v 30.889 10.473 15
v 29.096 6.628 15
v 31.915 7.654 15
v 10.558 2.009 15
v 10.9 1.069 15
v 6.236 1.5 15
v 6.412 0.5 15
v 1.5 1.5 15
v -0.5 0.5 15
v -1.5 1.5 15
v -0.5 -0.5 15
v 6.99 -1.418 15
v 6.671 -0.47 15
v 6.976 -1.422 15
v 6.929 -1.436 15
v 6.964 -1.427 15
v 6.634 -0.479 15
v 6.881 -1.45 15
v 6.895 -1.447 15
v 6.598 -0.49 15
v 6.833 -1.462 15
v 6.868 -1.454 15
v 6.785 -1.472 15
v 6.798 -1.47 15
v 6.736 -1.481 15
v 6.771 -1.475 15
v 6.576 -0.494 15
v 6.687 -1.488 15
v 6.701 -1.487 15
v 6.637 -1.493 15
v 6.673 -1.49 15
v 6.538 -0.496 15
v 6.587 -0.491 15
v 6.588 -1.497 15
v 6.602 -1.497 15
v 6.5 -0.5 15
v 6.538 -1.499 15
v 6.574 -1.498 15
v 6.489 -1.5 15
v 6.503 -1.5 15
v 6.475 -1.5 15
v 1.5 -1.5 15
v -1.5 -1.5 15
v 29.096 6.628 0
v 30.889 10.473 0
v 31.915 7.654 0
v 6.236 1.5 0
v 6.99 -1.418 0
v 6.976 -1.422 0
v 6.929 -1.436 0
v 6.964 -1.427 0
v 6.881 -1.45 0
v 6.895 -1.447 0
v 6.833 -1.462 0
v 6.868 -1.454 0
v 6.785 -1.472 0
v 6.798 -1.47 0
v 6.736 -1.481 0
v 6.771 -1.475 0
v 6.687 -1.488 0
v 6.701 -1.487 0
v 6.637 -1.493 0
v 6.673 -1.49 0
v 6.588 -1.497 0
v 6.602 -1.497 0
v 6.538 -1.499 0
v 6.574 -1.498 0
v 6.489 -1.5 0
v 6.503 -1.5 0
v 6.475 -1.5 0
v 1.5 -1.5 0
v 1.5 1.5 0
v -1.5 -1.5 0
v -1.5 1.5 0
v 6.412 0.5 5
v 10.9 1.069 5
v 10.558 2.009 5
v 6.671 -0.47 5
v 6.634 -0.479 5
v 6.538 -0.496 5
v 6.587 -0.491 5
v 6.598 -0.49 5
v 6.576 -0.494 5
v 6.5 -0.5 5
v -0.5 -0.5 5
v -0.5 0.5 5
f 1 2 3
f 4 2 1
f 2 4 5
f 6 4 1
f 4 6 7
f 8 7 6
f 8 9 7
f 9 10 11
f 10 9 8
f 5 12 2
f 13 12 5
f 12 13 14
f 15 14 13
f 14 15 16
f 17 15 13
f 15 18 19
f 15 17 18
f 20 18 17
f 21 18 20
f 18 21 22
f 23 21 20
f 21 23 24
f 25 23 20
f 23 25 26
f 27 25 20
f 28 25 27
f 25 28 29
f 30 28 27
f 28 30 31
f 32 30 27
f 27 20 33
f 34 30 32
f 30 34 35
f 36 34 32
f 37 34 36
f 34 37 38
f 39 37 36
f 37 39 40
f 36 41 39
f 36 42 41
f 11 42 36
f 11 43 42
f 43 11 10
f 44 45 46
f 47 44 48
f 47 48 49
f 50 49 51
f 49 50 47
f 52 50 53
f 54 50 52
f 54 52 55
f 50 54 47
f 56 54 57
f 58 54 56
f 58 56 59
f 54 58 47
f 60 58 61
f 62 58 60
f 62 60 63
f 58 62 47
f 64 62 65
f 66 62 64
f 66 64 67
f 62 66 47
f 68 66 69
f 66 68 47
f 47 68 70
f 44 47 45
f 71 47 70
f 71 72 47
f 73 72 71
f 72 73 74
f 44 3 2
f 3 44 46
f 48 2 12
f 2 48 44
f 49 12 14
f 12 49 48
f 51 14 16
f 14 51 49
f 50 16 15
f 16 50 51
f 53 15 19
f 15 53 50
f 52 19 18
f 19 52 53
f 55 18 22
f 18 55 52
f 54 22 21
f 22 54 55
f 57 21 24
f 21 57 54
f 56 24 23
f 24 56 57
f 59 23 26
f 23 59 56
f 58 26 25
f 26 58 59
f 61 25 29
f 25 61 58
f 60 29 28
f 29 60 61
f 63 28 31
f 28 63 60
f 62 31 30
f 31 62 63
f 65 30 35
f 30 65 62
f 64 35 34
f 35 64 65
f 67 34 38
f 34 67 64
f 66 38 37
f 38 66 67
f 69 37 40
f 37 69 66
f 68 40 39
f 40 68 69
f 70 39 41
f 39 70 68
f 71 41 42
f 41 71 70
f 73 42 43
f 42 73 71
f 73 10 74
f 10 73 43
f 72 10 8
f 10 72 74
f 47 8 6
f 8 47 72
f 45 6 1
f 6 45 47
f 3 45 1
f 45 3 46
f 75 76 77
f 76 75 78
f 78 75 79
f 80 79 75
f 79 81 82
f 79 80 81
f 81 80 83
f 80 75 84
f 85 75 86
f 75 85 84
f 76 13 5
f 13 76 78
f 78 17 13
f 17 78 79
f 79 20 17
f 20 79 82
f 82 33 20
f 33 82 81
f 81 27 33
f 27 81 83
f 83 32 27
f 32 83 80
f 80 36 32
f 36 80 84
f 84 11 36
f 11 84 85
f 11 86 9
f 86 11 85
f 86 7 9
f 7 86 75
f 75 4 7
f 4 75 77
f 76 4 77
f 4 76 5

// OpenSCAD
Arm_Length = 6.5; // 0.1
Arm_Width = 10; // 0.1
Arm_Thickness = 1; // 0.1
Tab_Length = 4.0; // 0.1
Tab_Angle = 20; // 0.1
Extension_Length = 25; // 0.1
Extension_Width = 15; // 0.1
Extension_Thickness = 3; // 0.1

$fa = $preview ? 10 : 2;
$fs = $preview ? 0.5 : 0.1;

module line(start, end, thickness = 1) {
	hull() {
		translate(start)
			if ($children > 0)
				children(0);
			else
				square(thickness, center=true);
		translate(end)
			if ($children > 1)
				children(1);
			else if ($children > 0)
				children(0);
			else
				square(thickness, center=true);
	}
}

translate([0, 0, Extension_Width])
	rotate(180, [1, 0, 0])
		difference() {
			linear_extrude(Extension_Width) {
				line([0,0], [Arm_Length, 0]) {
					square(Extension_Thickness, center=true);
					circle(d=Extension_Thickness);
				}

				translate([Arm_Length, 0, 0])
					rotate(-Tab_Angle, [0,0,1])
						line([0,0], [Extension_Length, 0]) {
							circle(d=Extension_Thickness);
							square(Extension_Thickness, center=true);
						}
			}
			translate([0, 0, -1])
				linear_extrude(Arm_Width+1) {
					line([0,0], [Arm_Length, 0]) {
						square(Arm_Thickness, center=true);
						circle(d=Arm_Thickness);
					}

					translate([Arm_Length, 0, 0])
						rotate(-Tab_Angle, [0,0,1])
							line([0,0], [Tab_Length, 0]) {
								circle(d=Arm_Thickness);
								square(Arm_Thickness, center=true);
							}
				}
		}
